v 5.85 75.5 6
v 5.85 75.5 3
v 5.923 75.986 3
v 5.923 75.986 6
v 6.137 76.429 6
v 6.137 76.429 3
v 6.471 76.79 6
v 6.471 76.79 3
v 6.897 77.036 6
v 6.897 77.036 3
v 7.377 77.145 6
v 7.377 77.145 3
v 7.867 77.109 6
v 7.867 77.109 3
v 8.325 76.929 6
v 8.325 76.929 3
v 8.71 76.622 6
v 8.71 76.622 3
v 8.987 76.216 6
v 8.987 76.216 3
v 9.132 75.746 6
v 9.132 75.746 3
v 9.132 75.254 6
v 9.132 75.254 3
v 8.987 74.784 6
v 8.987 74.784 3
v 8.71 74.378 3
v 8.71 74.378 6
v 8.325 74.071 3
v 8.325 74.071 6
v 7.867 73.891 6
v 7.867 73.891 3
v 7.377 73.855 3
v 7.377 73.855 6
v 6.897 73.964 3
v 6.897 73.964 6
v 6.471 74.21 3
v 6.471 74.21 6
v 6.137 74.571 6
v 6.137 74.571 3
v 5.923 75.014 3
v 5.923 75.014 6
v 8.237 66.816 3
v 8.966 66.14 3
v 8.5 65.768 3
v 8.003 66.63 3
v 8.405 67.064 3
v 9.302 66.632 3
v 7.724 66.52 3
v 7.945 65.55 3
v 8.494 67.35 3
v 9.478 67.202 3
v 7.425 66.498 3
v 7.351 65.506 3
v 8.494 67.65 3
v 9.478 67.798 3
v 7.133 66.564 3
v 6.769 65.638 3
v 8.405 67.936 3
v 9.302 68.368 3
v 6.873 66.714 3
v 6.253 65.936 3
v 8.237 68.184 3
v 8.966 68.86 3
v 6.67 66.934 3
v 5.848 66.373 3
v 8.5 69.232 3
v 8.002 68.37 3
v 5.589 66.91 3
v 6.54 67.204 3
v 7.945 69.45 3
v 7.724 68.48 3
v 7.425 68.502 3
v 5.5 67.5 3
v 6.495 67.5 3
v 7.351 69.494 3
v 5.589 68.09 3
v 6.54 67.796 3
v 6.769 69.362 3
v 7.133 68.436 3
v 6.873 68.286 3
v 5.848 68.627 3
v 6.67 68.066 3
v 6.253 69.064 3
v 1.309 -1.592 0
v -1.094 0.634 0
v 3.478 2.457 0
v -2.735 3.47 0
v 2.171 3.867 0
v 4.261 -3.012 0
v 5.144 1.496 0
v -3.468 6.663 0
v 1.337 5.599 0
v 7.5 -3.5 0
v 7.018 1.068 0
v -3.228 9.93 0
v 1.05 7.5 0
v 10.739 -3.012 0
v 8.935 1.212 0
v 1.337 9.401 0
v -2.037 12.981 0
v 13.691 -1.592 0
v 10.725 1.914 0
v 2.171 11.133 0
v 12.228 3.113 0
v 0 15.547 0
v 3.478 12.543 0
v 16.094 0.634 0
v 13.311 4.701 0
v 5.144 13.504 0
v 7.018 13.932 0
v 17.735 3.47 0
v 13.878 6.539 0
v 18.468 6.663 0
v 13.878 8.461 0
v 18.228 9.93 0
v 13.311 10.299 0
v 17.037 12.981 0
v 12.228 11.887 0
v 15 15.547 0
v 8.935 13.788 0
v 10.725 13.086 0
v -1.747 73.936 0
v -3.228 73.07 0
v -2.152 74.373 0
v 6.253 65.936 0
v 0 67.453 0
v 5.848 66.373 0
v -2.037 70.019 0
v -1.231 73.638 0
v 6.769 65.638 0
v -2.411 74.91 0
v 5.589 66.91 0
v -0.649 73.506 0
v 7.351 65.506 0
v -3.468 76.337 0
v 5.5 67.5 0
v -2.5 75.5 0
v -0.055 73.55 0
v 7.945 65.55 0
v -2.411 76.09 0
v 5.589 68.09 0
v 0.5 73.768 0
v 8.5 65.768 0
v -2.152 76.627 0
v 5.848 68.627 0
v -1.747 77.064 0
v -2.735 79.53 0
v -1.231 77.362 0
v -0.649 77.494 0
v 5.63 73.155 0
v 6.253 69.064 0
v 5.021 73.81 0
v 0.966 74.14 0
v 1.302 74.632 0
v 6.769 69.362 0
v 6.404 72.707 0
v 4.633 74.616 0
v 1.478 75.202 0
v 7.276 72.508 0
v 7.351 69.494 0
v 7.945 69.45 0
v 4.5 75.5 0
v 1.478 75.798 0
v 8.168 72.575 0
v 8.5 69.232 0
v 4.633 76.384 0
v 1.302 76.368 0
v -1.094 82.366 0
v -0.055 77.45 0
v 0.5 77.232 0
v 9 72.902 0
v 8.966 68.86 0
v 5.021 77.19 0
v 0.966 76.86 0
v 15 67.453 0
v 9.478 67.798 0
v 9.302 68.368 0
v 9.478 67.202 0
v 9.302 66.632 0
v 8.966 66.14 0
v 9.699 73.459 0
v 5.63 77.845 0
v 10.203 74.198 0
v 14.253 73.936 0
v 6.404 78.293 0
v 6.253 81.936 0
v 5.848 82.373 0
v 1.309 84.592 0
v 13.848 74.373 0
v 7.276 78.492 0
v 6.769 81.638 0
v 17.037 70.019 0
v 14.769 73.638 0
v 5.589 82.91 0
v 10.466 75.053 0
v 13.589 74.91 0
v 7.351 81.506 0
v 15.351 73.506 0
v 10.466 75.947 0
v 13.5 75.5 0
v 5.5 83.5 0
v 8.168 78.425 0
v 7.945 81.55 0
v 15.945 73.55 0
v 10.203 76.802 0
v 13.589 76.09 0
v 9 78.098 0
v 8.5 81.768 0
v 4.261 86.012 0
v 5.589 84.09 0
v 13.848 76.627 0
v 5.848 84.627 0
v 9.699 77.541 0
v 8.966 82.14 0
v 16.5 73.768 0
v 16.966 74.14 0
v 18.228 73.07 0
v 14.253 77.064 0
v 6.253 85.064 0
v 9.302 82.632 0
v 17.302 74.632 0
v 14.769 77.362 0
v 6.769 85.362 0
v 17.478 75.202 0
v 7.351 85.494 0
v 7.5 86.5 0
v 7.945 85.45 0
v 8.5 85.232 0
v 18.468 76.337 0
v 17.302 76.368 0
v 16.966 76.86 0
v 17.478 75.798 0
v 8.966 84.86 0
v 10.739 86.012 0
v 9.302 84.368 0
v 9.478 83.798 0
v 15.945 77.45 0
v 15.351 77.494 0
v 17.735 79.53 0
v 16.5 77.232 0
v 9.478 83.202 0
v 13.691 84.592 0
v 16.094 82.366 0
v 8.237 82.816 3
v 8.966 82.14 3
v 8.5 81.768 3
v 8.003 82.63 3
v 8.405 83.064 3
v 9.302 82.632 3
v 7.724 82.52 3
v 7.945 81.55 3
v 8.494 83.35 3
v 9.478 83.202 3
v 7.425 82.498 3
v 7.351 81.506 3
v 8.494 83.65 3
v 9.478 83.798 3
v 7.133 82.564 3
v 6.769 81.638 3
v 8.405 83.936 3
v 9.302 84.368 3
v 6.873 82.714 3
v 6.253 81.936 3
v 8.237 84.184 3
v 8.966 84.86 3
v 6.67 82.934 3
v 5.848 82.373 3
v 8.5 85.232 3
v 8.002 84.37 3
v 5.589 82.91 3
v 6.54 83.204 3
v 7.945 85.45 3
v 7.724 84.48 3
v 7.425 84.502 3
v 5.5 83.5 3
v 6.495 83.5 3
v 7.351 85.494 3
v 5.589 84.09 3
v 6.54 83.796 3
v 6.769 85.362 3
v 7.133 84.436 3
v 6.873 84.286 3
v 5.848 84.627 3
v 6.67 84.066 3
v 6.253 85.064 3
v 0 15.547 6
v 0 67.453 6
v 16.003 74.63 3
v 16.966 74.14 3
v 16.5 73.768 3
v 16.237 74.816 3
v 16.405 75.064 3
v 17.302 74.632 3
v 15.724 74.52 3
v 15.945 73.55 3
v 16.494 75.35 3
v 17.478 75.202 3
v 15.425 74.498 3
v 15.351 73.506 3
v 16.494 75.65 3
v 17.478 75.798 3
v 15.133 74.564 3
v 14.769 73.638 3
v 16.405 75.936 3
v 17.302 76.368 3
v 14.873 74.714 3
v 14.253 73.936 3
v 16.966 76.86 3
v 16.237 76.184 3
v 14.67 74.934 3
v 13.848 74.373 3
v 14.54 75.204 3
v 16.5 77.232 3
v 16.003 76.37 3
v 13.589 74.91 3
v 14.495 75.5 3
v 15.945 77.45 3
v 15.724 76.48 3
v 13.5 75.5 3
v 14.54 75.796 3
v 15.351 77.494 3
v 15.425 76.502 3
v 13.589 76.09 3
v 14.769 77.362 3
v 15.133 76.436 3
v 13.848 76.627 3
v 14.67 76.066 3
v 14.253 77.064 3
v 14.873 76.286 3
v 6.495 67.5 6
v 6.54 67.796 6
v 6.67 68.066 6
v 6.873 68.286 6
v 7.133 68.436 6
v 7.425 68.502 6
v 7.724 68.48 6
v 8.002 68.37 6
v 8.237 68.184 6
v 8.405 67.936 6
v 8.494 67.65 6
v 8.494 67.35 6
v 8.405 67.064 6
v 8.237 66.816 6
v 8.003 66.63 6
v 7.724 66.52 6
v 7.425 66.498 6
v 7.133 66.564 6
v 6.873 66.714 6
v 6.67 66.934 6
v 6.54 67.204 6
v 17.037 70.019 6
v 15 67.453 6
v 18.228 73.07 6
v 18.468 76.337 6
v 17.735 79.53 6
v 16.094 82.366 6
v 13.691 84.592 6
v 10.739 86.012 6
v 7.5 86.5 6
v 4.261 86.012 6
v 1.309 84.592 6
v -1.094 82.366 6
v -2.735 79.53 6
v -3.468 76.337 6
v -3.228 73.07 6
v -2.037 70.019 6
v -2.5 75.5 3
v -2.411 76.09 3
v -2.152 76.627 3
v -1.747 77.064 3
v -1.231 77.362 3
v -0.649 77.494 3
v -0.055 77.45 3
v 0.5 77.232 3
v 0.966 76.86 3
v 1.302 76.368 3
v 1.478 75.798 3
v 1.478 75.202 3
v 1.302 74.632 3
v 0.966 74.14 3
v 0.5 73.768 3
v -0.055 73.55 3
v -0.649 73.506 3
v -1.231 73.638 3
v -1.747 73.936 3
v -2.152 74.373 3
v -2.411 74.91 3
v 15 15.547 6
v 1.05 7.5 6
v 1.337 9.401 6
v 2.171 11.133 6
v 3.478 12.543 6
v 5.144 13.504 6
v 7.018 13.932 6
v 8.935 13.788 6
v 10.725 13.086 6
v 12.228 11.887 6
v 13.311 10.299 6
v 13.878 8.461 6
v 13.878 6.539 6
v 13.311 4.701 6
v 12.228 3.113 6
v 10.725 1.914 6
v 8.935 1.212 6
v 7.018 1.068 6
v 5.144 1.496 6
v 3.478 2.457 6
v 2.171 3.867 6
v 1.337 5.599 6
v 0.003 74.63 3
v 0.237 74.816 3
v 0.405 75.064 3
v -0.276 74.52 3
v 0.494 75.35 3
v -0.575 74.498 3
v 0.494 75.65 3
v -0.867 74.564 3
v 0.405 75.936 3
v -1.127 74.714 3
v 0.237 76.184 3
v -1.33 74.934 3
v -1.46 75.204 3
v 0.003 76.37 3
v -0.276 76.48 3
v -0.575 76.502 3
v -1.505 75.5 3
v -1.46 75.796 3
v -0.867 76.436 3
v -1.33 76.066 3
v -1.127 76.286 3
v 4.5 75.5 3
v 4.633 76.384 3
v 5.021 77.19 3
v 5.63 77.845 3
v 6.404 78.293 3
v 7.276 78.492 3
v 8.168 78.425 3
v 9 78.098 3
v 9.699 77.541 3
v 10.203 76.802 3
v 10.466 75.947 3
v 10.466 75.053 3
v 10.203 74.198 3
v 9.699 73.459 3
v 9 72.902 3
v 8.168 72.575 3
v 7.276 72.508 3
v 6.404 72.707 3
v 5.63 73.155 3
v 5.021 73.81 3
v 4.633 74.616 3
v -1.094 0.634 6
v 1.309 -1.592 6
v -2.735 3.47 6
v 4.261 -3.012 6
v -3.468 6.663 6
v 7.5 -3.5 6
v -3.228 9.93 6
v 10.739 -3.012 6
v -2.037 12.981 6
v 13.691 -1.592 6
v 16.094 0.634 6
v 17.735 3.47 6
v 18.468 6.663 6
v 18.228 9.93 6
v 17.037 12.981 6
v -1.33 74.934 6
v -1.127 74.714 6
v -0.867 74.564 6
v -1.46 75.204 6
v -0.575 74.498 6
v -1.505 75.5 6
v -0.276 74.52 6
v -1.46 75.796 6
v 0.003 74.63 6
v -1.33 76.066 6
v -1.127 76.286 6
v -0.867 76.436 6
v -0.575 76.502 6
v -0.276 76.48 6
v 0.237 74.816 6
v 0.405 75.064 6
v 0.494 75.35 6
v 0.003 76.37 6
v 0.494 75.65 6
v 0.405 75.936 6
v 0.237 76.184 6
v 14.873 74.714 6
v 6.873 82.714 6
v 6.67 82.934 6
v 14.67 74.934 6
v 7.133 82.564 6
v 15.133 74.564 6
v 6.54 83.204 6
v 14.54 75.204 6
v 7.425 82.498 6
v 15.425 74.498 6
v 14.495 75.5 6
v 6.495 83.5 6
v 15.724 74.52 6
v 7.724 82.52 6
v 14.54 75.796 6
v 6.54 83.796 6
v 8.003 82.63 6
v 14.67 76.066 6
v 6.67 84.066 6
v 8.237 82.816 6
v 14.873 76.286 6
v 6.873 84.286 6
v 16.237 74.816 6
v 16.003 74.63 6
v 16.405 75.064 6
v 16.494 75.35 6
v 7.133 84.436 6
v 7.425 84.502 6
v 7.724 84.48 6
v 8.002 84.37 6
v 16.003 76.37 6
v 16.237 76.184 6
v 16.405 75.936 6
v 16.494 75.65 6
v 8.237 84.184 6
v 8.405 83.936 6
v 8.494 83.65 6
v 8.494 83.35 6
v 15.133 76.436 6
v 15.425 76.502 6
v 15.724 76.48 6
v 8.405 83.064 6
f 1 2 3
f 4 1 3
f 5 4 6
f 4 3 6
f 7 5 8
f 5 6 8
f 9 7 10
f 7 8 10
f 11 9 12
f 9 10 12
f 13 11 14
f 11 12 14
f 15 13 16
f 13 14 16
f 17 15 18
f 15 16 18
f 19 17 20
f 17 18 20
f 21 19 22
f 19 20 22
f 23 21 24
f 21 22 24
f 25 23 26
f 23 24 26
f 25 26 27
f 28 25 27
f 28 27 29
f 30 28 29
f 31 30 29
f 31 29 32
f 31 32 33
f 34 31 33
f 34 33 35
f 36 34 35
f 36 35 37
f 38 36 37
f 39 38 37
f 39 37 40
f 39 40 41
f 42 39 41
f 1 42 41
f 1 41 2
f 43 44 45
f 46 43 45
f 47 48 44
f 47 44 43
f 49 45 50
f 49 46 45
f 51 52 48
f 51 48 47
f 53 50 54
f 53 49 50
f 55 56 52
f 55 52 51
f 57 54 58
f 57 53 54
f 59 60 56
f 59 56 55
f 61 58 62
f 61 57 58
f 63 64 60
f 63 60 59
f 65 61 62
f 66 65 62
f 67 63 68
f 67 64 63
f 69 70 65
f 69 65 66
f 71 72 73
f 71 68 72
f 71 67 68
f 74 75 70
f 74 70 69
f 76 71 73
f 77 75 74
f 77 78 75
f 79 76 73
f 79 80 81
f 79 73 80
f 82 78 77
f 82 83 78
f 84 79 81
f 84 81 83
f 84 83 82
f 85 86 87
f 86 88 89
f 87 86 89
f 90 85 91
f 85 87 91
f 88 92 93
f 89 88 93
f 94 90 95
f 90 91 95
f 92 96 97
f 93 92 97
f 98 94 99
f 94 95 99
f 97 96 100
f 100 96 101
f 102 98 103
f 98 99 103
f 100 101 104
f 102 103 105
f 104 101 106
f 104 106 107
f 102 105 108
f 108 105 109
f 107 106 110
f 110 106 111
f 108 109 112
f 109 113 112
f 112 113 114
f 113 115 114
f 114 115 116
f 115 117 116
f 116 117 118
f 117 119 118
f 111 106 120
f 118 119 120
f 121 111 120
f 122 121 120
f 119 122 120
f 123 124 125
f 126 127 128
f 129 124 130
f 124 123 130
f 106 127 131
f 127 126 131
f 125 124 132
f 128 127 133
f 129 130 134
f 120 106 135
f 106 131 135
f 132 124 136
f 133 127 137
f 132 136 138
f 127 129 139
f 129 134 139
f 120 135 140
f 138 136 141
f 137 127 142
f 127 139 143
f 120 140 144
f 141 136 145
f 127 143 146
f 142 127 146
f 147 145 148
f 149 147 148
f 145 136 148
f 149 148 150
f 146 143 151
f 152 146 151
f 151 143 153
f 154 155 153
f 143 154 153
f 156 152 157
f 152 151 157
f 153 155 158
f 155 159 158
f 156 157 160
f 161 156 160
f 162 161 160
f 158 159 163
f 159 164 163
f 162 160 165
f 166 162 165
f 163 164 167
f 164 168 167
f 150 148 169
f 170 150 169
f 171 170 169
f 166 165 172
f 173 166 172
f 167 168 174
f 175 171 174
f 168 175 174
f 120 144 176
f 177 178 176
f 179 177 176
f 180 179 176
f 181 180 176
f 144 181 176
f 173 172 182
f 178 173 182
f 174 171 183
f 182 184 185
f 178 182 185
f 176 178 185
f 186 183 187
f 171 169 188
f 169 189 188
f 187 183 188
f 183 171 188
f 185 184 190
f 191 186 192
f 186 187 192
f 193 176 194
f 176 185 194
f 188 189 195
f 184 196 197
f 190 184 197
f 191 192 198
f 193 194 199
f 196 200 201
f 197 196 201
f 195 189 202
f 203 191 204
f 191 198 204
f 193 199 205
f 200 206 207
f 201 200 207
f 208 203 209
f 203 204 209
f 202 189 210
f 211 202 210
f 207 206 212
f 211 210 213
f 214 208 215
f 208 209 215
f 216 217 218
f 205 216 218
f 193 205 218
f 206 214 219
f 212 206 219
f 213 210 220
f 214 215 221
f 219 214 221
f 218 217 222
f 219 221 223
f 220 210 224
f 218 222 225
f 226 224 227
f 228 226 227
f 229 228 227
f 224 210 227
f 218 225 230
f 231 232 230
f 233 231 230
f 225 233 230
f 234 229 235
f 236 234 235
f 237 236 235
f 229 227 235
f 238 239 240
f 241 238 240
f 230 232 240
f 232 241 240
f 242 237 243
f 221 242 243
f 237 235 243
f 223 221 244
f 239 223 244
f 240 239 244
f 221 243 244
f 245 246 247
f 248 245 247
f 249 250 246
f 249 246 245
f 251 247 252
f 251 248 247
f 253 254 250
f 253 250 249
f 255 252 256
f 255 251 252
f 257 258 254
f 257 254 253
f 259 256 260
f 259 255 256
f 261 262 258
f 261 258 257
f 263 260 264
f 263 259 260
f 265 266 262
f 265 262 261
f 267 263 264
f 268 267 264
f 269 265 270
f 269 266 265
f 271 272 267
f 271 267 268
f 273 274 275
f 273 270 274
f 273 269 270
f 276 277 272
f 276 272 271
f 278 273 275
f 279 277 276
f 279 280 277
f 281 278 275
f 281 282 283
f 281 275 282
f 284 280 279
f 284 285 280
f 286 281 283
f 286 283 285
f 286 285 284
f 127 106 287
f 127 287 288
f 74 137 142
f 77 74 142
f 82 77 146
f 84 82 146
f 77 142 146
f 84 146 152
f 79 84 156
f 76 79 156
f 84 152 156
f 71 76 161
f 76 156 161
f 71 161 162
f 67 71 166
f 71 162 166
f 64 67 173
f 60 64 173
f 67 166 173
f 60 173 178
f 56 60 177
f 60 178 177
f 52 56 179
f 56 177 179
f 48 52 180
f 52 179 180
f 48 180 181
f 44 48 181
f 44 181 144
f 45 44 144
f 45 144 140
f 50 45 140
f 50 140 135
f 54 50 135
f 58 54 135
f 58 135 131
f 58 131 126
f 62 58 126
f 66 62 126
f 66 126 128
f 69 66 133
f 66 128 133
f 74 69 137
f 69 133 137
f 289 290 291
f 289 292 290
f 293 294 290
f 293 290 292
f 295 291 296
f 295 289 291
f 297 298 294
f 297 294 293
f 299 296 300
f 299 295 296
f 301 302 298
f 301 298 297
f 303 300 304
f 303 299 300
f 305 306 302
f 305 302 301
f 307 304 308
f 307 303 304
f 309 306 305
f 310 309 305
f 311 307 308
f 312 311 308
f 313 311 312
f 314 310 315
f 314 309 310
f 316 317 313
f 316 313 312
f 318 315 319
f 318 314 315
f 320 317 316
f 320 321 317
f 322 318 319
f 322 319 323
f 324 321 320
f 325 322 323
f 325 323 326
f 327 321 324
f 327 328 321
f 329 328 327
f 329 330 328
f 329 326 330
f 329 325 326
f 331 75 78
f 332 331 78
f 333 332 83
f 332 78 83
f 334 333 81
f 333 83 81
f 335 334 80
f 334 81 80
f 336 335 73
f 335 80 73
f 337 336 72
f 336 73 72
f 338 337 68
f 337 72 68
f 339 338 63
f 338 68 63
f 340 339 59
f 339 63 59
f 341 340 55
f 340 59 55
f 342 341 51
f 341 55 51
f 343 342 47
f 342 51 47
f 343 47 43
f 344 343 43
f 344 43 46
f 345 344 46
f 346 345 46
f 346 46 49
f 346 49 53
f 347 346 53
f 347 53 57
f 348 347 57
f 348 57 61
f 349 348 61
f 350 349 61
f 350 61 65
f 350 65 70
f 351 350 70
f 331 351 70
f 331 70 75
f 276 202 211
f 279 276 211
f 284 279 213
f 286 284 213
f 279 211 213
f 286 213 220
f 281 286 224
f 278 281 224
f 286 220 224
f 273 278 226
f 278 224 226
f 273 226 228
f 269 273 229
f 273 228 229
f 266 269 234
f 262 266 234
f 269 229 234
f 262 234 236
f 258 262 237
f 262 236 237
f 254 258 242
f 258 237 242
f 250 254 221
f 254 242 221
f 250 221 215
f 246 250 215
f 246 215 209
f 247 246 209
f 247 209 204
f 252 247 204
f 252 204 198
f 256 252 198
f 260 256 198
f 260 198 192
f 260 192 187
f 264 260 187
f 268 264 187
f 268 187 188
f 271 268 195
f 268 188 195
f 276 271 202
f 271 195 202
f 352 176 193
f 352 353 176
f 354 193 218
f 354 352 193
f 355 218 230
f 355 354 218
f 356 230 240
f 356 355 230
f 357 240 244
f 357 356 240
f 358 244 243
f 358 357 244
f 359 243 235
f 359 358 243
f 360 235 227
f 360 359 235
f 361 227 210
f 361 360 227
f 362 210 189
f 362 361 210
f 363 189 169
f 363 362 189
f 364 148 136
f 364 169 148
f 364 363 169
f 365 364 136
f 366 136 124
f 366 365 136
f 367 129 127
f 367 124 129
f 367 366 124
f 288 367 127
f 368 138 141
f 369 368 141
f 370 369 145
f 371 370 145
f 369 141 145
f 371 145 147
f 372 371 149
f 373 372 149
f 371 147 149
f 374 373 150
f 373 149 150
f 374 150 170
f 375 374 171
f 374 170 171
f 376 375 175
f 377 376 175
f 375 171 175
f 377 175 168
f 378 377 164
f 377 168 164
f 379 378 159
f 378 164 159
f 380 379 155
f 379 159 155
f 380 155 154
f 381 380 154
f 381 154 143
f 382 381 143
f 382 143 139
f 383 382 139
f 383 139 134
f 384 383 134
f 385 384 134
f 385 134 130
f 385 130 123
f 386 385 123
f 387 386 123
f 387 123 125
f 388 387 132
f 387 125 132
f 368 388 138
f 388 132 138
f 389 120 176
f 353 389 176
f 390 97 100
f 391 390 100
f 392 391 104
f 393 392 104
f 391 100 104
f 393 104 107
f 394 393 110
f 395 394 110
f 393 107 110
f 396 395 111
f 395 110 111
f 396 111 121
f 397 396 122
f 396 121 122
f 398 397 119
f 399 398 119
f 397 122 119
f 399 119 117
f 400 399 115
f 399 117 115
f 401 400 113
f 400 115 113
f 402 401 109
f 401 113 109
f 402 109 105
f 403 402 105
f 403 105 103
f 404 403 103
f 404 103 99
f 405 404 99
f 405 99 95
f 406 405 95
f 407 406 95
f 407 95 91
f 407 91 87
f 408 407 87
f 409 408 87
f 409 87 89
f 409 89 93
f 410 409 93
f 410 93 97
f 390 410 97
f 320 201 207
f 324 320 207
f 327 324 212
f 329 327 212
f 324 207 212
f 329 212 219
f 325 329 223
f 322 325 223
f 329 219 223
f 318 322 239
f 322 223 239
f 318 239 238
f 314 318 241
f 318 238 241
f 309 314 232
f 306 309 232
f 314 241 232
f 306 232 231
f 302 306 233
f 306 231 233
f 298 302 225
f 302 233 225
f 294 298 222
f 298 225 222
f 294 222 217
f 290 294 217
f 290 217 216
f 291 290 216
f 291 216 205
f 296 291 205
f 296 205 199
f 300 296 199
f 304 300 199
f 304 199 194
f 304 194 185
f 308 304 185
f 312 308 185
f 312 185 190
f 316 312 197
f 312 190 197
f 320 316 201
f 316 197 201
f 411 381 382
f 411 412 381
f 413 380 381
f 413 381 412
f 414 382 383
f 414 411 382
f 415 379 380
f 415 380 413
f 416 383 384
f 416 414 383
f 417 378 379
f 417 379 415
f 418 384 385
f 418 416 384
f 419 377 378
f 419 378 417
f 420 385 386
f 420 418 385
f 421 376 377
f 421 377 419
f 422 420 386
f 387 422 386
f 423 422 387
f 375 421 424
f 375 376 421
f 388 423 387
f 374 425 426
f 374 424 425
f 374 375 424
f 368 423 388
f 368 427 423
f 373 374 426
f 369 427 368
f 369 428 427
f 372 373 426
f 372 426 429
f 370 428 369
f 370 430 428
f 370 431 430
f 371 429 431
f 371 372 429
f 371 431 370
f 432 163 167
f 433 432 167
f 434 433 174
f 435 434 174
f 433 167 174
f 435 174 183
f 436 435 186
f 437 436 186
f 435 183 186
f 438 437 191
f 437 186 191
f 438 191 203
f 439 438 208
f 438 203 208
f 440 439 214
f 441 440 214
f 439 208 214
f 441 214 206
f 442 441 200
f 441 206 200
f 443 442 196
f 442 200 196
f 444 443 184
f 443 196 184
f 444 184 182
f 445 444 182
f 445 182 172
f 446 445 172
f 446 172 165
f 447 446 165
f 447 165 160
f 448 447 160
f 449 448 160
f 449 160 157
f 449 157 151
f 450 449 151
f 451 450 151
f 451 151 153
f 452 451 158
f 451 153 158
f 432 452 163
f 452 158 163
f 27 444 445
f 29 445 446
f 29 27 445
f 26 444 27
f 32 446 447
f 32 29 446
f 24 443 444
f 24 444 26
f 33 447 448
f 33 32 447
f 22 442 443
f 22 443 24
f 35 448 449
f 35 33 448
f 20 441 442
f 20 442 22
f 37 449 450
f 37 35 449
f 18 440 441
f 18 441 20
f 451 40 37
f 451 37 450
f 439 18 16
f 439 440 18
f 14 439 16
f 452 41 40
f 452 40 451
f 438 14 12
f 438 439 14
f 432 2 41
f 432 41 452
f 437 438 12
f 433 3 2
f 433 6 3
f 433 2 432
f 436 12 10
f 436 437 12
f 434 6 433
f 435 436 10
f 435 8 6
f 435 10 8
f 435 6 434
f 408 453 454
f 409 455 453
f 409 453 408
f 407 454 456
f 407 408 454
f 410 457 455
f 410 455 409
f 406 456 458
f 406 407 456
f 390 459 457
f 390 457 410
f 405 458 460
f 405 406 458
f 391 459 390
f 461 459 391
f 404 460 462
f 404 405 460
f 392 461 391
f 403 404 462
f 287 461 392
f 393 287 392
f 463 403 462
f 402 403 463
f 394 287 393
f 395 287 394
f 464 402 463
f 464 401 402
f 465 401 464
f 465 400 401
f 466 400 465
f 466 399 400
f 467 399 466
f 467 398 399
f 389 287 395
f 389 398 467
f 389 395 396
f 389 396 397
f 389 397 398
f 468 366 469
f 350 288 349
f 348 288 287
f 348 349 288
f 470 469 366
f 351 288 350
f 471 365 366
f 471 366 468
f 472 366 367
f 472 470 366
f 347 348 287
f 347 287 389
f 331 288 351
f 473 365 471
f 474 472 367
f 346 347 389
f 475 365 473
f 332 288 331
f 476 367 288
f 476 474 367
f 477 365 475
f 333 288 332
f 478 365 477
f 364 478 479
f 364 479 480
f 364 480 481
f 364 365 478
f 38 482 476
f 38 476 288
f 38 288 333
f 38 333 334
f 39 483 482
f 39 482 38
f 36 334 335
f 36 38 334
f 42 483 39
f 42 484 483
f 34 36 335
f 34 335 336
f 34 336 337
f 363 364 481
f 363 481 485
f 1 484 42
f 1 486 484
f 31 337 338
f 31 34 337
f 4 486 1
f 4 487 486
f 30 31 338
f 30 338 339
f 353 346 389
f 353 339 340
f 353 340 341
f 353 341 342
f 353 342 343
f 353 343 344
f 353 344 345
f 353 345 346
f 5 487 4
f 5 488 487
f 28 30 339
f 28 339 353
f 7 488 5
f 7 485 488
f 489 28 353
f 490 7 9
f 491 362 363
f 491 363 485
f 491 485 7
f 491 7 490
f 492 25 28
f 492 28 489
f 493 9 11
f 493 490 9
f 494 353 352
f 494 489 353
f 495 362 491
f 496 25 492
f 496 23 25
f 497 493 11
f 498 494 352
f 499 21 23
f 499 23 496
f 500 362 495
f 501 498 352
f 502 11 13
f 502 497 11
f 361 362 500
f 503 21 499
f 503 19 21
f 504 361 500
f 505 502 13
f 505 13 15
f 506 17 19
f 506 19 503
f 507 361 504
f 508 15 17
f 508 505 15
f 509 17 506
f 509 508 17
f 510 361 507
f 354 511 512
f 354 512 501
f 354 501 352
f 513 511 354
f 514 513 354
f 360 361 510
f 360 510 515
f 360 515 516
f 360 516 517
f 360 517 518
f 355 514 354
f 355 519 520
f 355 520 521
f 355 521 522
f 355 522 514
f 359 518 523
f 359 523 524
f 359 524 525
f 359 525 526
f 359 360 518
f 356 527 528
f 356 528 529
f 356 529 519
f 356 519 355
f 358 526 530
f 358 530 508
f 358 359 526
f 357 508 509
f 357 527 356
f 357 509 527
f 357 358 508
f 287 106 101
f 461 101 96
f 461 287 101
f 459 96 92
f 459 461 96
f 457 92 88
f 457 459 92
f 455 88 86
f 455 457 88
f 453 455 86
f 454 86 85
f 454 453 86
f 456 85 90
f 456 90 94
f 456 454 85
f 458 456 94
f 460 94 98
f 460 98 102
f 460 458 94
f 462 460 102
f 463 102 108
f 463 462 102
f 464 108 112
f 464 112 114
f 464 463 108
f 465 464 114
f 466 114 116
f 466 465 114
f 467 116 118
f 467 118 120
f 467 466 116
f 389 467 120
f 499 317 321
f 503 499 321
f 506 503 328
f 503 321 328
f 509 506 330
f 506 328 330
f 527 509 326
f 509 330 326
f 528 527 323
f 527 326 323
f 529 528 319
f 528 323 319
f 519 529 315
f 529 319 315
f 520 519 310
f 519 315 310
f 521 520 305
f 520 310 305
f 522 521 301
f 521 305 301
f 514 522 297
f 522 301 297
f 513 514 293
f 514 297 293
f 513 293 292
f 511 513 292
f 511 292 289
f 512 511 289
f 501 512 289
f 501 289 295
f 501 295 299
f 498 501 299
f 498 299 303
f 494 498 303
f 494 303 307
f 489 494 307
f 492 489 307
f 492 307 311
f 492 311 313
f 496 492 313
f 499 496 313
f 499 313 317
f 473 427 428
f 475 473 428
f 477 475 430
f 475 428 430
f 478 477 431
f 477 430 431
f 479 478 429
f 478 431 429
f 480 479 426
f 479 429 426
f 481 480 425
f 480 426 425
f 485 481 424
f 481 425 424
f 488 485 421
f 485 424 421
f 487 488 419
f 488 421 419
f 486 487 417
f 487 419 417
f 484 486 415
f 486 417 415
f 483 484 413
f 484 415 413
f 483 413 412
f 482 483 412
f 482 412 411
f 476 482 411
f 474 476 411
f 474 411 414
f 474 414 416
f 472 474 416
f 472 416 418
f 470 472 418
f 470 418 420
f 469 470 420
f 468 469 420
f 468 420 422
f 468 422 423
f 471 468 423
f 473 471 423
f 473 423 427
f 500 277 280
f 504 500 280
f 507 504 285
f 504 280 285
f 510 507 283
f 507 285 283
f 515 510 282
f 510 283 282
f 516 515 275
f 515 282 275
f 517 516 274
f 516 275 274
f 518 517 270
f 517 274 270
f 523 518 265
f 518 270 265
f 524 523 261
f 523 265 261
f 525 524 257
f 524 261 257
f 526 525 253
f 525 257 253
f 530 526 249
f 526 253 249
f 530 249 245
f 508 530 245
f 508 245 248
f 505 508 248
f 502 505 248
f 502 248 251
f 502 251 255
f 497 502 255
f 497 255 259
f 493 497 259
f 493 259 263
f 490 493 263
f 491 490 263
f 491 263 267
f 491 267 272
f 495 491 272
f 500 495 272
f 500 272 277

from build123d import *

# Parameters (mm, degrees)
ESQUISSE1_W             = 15
ESQUISSE1_H             = 83
BOSS_EXTRU_1_DEPTH      = 6
ESQUISSE2_R             = 11
BOSS_EXTRU_2_DEPTH      = 6
ESQUISSE4_R             = 1.65
ESQUISSE4_R_2           = 1.005
ESQUISSE4_R_3           = 6.45
ENL_V_MAT_EXTRU_2_DEPTH = 10
ESQUISSE5_R             = 3
ESQUISSE5_R_2           = 2
ENL_V_MAT_EXTRU_3_DEPTH = 3


with BuildPart() as part:
    # Esquisse1 → Boss.-Extru.1 (new body)
    with BuildSketch(Plane.XY):
        with Locations((7.5, 41.5)):
            Rectangle(ESQUISSE1_W, ESQUISSE1_H)
    extrude(amount=BOSS_EXTRU_1_DEPTH)

    # Esquisse2 → Boss.-Extru.2 (add)
    with BuildSketch(Plane.XY.offset(6)):
        with Locations((7.5, 7.5)):
            Circle(ESQUISSE2_R)
        with Locations((7.5, 75.5)):
            Circle(ESQUISSE2_R)
    extrude(amount=-BOSS_EXTRU_2_DEPTH)

    # Esquisse4 → Enlèv. mat.-Extru.2 (cut)
    with BuildSketch(Plane(origin=(0, 0, 0), x_dir=(-1, 0, 0), z_dir=(0, 0, -1))):
        with Locations((-7.5, 75.5)):
            Circle(ESQUISSE4_R)
        with Locations((-7.5, 67.5)):
            Circle(ESQUISSE4_R_2)
        with Locations((-15.5, 75.5)):
            Circle(ESQUISSE4_R_2)
        with Locations((-7.5, 83.5)):
            Circle(ESQUISSE4_R_2)
        with Locations((0.5, 75.5)):
            Circle(ESQUISSE4_R_2)
        with Locations((-7.5, 7.5)):
            Circle(ESQUISSE4_R_3)
    extrude(amount=-ENL_V_MAT_EXTRU_2_DEPTH, mode=Mode.SUBTRACT)

    # Esquisse5 → Enlèv. mat.-Extru.3 (cut)
    with BuildSketch(Plane(origin=(0, 0, 0), x_dir=(-1, 0, 0), z_dir=(0, 0, -1))):
        with Locations((-7.5, 75.5)):
            Circle(ESQUISSE5_R)
        with Locations((-15.5, 75.5)):
            Circle(ESQUISSE5_R_2)
        with Locations((-7.5, 83.5)):
            Circle(ESQUISSE5_R_2)
        with Locations((0.5, 75.5)):
            Circle(ESQUISSE5_R_2)
        with Locations((-7.5, 67.5)):
            Circle(ESQUISSE5_R_2)
    extrude(amount=-ENL_V_MAT_EXTRU_3_DEPTH, mode=Mode.SUBTRACT)


solid = part.part
